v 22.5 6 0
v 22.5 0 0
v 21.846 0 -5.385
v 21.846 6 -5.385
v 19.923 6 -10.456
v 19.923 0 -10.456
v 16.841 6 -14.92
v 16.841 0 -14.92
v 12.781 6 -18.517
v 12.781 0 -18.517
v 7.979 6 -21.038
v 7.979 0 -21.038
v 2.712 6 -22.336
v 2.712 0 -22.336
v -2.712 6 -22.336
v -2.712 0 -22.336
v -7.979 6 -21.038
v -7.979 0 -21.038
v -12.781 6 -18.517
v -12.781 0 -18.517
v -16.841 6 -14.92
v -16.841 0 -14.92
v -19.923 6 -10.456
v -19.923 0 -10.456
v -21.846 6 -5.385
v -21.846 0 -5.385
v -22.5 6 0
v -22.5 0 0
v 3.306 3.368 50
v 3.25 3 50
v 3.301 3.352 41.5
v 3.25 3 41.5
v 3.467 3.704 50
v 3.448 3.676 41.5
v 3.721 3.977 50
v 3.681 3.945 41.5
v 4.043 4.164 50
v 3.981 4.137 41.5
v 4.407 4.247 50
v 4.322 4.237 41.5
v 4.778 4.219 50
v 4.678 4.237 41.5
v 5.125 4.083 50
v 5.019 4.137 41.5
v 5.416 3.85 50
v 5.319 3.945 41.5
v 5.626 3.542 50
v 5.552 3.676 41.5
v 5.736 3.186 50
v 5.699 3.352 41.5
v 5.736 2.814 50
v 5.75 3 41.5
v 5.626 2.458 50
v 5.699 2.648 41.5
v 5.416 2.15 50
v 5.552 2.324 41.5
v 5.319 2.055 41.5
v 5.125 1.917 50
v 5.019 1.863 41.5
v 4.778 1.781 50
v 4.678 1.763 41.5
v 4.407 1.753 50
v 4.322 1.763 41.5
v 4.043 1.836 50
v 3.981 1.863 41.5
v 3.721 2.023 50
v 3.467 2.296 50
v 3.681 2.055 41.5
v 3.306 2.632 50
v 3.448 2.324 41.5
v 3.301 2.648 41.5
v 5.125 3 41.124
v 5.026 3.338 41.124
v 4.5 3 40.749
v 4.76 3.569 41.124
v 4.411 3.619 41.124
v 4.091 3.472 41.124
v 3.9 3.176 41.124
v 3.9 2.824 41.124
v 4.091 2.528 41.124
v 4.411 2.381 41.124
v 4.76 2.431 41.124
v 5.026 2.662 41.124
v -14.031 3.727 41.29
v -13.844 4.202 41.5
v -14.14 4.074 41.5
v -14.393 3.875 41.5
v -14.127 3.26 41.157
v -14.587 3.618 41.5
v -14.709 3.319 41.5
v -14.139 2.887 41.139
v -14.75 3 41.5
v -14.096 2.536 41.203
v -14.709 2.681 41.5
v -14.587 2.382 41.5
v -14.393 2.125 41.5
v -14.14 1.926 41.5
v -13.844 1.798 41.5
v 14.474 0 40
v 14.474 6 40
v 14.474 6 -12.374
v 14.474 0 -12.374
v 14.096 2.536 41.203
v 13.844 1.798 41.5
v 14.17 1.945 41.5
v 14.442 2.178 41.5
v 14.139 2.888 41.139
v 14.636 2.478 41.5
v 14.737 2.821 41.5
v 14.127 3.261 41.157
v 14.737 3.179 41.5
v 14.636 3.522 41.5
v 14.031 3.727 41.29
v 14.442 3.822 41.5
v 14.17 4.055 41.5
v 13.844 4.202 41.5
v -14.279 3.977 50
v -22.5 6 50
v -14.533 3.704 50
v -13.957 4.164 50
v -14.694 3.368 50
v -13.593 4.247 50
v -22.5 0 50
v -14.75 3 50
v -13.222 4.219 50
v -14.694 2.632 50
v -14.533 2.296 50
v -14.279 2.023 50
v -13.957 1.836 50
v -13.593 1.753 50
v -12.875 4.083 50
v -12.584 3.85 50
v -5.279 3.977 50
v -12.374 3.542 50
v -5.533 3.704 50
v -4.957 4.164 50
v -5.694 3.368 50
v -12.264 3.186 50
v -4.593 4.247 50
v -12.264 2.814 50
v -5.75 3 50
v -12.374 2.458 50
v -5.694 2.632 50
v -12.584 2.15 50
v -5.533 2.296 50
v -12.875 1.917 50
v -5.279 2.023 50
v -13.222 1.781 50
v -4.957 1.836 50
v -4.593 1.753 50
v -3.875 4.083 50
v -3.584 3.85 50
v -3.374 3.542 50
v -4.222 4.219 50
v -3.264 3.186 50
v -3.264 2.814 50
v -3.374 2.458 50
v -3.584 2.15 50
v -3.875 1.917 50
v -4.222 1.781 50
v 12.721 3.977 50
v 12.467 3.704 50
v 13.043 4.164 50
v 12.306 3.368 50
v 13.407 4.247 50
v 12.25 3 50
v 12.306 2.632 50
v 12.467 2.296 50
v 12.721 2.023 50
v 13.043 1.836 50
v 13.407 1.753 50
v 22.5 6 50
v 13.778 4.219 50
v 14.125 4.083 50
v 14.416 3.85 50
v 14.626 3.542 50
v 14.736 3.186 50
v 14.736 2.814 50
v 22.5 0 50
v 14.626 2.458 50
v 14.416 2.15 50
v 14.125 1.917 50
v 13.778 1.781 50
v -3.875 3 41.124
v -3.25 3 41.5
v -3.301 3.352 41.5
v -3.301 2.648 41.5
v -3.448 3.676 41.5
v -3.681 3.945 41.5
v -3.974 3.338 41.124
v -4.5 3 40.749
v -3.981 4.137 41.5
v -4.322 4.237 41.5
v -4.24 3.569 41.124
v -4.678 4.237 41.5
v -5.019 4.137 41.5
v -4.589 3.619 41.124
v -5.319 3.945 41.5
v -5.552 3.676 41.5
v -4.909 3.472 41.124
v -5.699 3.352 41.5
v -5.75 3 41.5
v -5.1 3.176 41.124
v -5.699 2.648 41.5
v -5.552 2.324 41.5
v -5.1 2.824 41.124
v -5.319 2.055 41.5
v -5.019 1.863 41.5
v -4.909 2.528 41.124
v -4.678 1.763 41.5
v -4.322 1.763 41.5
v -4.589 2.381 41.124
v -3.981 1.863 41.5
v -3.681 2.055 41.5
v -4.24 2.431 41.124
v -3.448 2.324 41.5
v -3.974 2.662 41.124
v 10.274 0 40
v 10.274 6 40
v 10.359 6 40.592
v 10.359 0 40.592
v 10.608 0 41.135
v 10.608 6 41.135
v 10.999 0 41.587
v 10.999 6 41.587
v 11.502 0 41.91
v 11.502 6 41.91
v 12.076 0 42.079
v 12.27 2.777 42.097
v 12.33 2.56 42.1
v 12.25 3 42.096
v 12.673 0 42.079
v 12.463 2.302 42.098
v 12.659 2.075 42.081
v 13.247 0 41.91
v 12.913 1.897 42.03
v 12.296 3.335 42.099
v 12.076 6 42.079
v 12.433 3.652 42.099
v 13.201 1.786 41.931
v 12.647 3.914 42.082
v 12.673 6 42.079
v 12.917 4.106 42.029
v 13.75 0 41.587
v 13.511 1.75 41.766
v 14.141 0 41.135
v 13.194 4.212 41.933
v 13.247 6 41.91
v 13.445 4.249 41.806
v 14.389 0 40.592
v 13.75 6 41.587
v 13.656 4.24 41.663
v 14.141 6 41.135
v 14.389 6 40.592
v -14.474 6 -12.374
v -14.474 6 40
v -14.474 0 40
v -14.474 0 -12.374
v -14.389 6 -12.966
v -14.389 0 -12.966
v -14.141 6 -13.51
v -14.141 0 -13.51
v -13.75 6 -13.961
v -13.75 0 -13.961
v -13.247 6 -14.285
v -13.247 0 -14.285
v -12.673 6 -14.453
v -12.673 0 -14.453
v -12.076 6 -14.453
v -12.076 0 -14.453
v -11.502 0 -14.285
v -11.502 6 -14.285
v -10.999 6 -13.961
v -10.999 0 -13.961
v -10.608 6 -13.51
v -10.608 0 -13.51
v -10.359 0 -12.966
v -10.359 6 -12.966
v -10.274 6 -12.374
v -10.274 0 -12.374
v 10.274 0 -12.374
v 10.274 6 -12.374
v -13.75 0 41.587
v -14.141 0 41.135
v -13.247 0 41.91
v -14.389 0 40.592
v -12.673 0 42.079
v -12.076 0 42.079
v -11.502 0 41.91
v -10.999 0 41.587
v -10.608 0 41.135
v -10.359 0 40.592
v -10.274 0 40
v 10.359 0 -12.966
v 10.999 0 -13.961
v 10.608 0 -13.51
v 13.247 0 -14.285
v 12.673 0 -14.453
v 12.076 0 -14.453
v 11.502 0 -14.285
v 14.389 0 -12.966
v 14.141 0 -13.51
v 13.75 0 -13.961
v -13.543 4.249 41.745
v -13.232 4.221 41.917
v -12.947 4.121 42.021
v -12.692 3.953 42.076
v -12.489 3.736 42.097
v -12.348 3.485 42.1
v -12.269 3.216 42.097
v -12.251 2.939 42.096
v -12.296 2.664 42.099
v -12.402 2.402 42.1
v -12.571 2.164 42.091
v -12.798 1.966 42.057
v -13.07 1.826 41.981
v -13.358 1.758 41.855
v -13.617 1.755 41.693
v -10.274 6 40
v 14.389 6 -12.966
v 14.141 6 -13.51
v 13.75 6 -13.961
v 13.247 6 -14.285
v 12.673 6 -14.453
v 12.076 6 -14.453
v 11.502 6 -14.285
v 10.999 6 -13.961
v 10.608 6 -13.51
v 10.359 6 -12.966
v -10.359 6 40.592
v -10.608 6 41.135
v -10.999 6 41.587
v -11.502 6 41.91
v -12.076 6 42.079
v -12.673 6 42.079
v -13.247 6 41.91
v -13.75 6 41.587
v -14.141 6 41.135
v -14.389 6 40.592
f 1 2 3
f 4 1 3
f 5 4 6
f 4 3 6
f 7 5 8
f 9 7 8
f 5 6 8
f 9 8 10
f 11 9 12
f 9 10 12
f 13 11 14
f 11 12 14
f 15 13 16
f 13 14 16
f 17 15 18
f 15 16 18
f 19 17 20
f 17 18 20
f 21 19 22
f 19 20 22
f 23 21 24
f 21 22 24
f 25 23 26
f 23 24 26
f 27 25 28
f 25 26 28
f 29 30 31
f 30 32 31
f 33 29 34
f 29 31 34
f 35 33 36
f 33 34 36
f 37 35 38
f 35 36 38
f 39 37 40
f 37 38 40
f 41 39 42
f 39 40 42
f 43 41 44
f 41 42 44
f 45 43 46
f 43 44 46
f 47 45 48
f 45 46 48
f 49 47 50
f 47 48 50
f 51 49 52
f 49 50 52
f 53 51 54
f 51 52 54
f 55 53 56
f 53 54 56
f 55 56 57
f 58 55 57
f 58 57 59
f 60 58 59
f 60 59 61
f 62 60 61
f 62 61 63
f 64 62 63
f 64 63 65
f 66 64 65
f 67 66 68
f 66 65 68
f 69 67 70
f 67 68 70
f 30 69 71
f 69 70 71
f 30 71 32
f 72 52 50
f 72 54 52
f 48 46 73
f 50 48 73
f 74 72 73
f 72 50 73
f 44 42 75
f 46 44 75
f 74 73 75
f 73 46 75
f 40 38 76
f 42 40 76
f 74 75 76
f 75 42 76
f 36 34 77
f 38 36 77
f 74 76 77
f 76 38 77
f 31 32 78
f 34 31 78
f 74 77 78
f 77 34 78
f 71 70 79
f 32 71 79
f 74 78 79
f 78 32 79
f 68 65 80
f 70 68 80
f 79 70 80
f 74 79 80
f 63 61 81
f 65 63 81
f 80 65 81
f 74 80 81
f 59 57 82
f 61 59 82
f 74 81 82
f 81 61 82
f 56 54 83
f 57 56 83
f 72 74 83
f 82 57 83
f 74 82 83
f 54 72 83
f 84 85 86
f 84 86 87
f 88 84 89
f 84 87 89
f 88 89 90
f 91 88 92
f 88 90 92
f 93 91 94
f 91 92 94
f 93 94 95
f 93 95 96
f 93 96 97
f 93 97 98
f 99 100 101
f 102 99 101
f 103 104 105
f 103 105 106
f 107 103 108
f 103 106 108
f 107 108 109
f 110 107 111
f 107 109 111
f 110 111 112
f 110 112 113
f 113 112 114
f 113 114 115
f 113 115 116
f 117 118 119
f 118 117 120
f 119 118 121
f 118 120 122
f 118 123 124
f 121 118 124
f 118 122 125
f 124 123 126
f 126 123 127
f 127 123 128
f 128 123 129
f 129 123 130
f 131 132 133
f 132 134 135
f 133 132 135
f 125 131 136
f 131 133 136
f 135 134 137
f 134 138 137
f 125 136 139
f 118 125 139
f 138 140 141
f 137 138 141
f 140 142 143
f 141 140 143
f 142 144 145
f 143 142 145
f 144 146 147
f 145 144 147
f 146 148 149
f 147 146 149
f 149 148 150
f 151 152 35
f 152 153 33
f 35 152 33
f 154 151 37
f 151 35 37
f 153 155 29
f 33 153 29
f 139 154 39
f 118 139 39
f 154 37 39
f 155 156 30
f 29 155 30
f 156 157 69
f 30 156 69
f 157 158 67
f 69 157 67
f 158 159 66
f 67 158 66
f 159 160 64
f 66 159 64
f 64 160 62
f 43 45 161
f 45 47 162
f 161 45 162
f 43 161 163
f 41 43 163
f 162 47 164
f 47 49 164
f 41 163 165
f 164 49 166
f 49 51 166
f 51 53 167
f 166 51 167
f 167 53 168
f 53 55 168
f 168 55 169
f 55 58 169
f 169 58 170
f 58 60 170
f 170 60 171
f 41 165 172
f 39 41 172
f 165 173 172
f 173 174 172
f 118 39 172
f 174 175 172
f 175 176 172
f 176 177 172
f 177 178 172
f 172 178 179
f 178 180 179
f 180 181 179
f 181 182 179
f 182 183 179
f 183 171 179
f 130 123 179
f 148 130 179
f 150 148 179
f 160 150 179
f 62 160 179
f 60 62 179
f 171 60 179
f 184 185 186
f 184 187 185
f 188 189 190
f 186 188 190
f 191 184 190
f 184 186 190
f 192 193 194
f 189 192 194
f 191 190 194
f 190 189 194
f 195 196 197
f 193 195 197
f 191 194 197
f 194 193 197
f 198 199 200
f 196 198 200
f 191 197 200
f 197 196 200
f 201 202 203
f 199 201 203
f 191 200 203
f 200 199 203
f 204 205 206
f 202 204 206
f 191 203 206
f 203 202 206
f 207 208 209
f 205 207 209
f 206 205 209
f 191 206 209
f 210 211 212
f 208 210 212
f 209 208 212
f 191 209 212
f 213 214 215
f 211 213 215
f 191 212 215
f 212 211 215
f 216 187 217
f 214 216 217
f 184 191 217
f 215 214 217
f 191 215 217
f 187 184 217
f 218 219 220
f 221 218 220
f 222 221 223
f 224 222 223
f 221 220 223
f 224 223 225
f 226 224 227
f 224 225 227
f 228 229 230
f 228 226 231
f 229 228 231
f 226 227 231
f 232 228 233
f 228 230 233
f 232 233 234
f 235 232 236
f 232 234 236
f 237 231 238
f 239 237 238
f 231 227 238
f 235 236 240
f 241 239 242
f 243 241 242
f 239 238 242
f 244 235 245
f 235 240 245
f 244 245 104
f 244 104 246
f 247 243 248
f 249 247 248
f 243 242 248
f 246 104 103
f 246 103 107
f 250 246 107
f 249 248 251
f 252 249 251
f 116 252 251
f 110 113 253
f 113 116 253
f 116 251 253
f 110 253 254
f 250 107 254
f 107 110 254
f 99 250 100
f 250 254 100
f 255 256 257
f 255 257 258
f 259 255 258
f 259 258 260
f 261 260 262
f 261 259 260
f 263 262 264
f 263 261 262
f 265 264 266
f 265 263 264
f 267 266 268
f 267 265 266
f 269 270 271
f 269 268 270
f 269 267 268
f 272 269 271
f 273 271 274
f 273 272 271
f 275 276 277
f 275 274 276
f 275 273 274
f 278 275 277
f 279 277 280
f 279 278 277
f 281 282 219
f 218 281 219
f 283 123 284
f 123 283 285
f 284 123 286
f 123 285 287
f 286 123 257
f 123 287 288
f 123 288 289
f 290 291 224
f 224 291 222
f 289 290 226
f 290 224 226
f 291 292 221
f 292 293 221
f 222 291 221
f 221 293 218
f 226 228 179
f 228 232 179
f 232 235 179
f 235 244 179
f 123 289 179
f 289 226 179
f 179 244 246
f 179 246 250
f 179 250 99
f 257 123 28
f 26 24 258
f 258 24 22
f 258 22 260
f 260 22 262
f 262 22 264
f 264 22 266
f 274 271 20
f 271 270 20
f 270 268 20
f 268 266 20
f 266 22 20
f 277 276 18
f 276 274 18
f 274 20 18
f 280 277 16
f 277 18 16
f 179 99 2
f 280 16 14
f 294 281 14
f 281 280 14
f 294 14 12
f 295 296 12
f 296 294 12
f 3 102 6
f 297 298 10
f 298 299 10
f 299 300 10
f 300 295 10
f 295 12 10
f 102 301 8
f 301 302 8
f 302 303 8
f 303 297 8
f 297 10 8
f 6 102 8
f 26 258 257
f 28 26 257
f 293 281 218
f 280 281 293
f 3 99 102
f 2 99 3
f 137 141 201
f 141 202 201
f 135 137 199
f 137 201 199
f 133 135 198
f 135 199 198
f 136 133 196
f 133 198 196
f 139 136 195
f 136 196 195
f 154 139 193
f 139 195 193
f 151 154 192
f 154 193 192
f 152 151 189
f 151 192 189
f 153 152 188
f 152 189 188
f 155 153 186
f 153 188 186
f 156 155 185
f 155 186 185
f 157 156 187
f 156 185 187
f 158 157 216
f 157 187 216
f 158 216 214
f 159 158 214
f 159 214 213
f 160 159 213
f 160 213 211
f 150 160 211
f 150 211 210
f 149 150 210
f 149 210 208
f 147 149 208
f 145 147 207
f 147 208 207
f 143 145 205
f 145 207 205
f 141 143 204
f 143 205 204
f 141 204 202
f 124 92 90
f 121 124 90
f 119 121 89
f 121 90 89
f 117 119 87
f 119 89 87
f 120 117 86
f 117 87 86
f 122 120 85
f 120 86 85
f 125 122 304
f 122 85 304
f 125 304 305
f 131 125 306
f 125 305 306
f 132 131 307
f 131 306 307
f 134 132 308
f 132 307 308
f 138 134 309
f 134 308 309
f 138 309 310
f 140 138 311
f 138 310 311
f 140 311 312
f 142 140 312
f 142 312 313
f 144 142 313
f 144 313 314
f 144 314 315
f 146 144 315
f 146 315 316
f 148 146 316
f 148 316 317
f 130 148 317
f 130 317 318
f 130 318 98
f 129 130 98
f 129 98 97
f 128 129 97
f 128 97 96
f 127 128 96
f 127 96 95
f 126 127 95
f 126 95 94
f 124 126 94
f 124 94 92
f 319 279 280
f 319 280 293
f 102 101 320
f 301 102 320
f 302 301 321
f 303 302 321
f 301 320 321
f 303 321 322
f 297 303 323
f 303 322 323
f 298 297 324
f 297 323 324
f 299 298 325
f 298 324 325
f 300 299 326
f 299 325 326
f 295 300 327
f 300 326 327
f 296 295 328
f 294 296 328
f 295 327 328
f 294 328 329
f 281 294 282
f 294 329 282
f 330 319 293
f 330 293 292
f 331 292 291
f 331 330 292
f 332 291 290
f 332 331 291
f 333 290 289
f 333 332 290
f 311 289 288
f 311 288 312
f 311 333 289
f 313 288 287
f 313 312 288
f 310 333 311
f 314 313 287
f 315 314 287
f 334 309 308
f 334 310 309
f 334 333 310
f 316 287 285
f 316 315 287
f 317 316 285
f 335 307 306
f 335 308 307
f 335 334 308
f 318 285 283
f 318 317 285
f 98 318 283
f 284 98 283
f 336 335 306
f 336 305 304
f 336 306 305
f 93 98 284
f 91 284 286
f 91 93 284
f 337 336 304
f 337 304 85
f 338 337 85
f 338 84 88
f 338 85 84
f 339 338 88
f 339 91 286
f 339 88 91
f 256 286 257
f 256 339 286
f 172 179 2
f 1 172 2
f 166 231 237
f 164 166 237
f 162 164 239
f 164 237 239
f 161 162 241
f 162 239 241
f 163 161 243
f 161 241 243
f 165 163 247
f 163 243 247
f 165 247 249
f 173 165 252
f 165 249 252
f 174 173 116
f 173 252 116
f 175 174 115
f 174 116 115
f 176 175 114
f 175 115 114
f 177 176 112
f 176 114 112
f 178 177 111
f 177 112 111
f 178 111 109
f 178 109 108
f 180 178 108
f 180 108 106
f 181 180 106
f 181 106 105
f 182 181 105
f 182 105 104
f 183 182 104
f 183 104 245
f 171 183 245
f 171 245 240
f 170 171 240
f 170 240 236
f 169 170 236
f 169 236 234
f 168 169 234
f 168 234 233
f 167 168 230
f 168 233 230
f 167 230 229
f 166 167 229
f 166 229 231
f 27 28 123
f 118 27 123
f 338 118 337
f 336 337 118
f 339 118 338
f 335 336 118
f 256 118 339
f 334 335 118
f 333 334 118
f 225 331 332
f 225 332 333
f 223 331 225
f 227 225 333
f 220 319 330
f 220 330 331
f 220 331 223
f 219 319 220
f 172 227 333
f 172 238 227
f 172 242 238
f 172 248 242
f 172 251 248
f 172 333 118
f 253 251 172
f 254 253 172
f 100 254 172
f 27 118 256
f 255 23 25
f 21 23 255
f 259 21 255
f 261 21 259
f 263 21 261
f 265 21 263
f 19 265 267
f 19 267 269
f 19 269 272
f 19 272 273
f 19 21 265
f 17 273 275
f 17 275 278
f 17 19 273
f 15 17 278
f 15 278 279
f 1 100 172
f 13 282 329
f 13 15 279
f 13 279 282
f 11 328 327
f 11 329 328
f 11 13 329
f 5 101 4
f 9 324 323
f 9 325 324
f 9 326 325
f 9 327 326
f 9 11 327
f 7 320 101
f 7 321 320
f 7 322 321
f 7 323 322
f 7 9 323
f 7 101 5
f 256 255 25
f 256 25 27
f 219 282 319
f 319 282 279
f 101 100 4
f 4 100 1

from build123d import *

# Parameters (mm, degrees)
EXTRUDE_1_DEPTH     = 6
CUT_EXTRUDE_1_DEPTH = 56.156595254
M3X0_51_D           = 2.5
M3X0_51_DEPTH       = 8.5
M3X0_51_TIP         = 0.751075774


with BuildPart() as part:
    # Эскиз1 → Бобышка-Вытянуть1 (new body)
    with BuildSketch(Plane(origin=(0, 0, 0), x_dir=(1, 0, 0), z_dir=(0, 1, 0))):
        with BuildLine():
            Line((-22.5, 0), (-22.5, -50))
            Line((-22.5, -50), (22.5, -50))
            Line((22.5, -50), (22.5, 0))
            ThreePointArc((22.5, 0), (0, 22.5), (-22.5, 0))
        make_face()
    extrude(amount=EXTRUDE_1_DEPTH)

    # Эскиз2 → Вырез-Вытянуть1 (cut, through all)
    with BuildSketch(Plane(origin=(0, 6, 0), x_dir=(1, 0, 0), z_dir=(0, 1, 0))):
        with BuildLine():
            Line((-10.274368671, 12.374368671), (-10.274368671, -40))
            ThreePointArc((-10.274368671, -40), (-12.374368671, -42.1), (-14.474368671, -40))
            Line((-14.474368671, -40), (-14.474368671, 12.374368671))
            ThreePointArc((-14.474368671, 12.374368671), (-12.374368671, 14.474368671), (-10.274368671, 12.374368671))
        make_face()
        with BuildLine():
            Line((10.274368671, 12.374368671), (10.274368671, -40))
            ThreePointArc((10.274368671, -40), (12.374368671, -42.1), (14.474368671, -40))
            Line((14.474368671, -40), (14.474368671, 12.374368671))
            ThreePointArc((14.474368671, 12.374368671), (12.374368671, 14.474368671), (10.274368671, 12.374368671))
        make_face()
    extrude(amount=-CUT_EXTRUDE_1_DEPTH, mode=Mode.SUBTRACT)

    # Отверстие обработанное метчиком M3x0.51
    with Locations(Plane.XY.offset(50)):
        with Locations((-13.5, 3), (-4.5, 3), (4.5, 3), (13.5, 3)):
            Hole(M3X0_51_D / 2, depth=M3X0_51_DEPTH)
            with Locations((0, 0, -(M3X0_51_DEPTH + M3X0_51_TIP / 2))):  # 118° drill point
                Cone(0, M3X0_51_D / 2, M3X0_51_TIP, mode=Mode.SUBTRACT)


solid = part.part
